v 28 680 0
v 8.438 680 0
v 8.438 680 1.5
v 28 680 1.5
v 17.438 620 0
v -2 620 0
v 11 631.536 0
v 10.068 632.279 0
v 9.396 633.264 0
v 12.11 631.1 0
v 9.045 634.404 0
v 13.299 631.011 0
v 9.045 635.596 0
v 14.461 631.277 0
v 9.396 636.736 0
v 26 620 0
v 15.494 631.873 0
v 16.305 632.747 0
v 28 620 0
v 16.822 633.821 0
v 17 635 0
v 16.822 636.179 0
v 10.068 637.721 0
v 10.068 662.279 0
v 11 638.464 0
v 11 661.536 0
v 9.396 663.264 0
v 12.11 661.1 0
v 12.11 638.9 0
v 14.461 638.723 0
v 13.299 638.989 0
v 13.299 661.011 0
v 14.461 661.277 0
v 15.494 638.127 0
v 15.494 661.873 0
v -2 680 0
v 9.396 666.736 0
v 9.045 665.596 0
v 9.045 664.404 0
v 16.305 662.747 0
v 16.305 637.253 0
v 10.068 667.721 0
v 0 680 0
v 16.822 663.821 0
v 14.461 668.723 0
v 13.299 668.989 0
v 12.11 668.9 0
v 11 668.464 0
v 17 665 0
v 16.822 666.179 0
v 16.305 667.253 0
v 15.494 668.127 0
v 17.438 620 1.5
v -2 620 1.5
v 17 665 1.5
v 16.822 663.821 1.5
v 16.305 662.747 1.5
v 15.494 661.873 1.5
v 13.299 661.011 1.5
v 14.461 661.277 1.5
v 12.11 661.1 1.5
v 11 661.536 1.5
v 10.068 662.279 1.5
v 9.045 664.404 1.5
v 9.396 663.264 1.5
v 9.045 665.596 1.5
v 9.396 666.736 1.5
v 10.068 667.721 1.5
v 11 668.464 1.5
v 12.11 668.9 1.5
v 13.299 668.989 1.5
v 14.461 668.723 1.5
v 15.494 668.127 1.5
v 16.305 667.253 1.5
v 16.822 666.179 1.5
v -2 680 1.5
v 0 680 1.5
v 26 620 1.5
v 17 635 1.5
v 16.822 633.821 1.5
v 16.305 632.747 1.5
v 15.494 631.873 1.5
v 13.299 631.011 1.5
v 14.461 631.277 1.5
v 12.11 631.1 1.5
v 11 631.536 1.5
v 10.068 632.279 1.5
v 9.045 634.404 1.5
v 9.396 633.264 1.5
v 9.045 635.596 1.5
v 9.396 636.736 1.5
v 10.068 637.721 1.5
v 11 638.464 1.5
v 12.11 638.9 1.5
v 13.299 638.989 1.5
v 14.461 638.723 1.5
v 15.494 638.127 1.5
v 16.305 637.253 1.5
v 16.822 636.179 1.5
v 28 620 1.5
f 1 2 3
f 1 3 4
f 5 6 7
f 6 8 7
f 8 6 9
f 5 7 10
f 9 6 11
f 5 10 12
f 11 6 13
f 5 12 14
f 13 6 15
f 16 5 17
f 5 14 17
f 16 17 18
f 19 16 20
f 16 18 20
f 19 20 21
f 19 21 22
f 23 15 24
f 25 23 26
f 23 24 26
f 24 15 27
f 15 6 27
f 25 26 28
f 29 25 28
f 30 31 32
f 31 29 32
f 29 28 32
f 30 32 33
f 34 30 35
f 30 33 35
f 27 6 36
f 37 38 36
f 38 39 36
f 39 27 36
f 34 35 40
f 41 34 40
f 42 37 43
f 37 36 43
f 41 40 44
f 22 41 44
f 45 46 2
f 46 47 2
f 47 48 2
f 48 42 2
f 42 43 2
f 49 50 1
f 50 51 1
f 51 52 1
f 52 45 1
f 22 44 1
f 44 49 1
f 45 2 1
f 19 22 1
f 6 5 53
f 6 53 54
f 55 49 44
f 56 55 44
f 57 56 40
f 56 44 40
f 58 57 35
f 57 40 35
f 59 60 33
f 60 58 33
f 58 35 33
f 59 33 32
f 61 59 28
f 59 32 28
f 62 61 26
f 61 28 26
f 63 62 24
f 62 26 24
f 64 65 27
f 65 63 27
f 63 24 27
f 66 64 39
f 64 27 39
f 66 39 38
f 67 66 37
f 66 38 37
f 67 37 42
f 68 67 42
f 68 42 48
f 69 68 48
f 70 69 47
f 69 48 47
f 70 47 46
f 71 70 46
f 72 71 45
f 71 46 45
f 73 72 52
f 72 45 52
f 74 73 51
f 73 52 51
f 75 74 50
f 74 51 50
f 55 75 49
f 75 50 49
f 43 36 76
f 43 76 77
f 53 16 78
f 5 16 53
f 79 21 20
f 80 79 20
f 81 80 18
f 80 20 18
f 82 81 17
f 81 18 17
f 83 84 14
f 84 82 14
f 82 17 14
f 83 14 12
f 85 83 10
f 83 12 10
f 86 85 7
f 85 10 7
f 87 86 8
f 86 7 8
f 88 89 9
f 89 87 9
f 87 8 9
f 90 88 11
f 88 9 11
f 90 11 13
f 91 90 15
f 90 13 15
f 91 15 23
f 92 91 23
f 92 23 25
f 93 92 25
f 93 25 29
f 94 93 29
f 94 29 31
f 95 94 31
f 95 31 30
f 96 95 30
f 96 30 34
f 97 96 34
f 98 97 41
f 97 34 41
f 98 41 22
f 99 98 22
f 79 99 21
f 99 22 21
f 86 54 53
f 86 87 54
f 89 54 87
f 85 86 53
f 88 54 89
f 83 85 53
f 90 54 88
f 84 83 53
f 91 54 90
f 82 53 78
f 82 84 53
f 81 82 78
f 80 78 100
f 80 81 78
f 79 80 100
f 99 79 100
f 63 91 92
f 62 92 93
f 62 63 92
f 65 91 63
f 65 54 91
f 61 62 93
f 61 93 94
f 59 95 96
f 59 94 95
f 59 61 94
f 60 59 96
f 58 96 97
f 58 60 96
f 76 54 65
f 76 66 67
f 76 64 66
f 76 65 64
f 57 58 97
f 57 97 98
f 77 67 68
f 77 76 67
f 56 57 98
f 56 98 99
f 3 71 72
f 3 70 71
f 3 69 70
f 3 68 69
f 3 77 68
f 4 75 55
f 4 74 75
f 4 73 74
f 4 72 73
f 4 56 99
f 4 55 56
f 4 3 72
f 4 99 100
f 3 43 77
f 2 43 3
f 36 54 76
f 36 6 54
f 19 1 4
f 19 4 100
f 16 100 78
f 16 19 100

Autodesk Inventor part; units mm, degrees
ref_plane "YZ Plane" through (0, 0, 0) normal (1, 0, 0) x (0, 1, 0)
ref_plane "XZ Plane" through (0, 0, 0) normal (0, 1, 0) x (-1, 0, 0)
ref_plane "XY Plane" through (0, 0, 0) normal (0, 0, 1) x (1, 0, 0)
sketch "Sketch1" plane through (0, 0, 0) normal (0, 0, 1) x (1, 0, 0)
  arc A0 (11.6513, 631.9608) -> (14.3394, 631.9567) centre (13, 635) ccw
  arc A1 (14.3394, 638.0433) -> (11.6606, 638.0433) centre (13, 635) ccw
  arc A2 (11.6513, 661.9608) -> (14.3394, 661.9567) centre (13, 665) ccw
  arc A3 (14.3394, 668.0433) -> (11.6606, 668.0433) centre (13, 665) ccw
  line L0 (25.9999, 620.0001) -> (17.4375, 620.0001)
  line L1 (0, 679.9999) -> (8.4375, 679.9999)
  circle A4 centre (13, 635) radius 4
  circle A5 centre (13, 665) radius 4
  line L2 (28, 620.0001) -> (-2, 620.0001)
  line L3 (-2, 620.0001) -> (-2, 679.9999)
  line L4 (-2, 679.9999) -> (28, 679.9999)
  line L5 (28, 679.9999) -> (28, 620.0001)
  line L6 (13, 620.0001) -> (13, 679.9999) construction
  point P0 (0, 0)
  dimension "d0" = 8
  dimension "d2" = 30
extrude "Plate1" add sketch "Sketch1" along normal blind 1.5
equation "\"BendRadius\" = Thickness"
equation "\"BendReliefWidth\" = Thickness"
equation "\"BendReliefDepth\" = 0.5 * Thickness"
equation "\"CornerReliefSize\" = 4 * Thickness"
equation "\"MinimumRemnant\" = 2 * Thickness"
equation "\"TransitionRadius\" = BendRadius"
equation "\"JacobiRadiusSize\" = BendRadius"
equation "\"GapSize\" = Thickness"
equation "\"d3\" = BendRadius"
equation "\"Thickness\" = 1.5"
properties part number "gabarito-travessa-60" material "Wood (Oak)"
